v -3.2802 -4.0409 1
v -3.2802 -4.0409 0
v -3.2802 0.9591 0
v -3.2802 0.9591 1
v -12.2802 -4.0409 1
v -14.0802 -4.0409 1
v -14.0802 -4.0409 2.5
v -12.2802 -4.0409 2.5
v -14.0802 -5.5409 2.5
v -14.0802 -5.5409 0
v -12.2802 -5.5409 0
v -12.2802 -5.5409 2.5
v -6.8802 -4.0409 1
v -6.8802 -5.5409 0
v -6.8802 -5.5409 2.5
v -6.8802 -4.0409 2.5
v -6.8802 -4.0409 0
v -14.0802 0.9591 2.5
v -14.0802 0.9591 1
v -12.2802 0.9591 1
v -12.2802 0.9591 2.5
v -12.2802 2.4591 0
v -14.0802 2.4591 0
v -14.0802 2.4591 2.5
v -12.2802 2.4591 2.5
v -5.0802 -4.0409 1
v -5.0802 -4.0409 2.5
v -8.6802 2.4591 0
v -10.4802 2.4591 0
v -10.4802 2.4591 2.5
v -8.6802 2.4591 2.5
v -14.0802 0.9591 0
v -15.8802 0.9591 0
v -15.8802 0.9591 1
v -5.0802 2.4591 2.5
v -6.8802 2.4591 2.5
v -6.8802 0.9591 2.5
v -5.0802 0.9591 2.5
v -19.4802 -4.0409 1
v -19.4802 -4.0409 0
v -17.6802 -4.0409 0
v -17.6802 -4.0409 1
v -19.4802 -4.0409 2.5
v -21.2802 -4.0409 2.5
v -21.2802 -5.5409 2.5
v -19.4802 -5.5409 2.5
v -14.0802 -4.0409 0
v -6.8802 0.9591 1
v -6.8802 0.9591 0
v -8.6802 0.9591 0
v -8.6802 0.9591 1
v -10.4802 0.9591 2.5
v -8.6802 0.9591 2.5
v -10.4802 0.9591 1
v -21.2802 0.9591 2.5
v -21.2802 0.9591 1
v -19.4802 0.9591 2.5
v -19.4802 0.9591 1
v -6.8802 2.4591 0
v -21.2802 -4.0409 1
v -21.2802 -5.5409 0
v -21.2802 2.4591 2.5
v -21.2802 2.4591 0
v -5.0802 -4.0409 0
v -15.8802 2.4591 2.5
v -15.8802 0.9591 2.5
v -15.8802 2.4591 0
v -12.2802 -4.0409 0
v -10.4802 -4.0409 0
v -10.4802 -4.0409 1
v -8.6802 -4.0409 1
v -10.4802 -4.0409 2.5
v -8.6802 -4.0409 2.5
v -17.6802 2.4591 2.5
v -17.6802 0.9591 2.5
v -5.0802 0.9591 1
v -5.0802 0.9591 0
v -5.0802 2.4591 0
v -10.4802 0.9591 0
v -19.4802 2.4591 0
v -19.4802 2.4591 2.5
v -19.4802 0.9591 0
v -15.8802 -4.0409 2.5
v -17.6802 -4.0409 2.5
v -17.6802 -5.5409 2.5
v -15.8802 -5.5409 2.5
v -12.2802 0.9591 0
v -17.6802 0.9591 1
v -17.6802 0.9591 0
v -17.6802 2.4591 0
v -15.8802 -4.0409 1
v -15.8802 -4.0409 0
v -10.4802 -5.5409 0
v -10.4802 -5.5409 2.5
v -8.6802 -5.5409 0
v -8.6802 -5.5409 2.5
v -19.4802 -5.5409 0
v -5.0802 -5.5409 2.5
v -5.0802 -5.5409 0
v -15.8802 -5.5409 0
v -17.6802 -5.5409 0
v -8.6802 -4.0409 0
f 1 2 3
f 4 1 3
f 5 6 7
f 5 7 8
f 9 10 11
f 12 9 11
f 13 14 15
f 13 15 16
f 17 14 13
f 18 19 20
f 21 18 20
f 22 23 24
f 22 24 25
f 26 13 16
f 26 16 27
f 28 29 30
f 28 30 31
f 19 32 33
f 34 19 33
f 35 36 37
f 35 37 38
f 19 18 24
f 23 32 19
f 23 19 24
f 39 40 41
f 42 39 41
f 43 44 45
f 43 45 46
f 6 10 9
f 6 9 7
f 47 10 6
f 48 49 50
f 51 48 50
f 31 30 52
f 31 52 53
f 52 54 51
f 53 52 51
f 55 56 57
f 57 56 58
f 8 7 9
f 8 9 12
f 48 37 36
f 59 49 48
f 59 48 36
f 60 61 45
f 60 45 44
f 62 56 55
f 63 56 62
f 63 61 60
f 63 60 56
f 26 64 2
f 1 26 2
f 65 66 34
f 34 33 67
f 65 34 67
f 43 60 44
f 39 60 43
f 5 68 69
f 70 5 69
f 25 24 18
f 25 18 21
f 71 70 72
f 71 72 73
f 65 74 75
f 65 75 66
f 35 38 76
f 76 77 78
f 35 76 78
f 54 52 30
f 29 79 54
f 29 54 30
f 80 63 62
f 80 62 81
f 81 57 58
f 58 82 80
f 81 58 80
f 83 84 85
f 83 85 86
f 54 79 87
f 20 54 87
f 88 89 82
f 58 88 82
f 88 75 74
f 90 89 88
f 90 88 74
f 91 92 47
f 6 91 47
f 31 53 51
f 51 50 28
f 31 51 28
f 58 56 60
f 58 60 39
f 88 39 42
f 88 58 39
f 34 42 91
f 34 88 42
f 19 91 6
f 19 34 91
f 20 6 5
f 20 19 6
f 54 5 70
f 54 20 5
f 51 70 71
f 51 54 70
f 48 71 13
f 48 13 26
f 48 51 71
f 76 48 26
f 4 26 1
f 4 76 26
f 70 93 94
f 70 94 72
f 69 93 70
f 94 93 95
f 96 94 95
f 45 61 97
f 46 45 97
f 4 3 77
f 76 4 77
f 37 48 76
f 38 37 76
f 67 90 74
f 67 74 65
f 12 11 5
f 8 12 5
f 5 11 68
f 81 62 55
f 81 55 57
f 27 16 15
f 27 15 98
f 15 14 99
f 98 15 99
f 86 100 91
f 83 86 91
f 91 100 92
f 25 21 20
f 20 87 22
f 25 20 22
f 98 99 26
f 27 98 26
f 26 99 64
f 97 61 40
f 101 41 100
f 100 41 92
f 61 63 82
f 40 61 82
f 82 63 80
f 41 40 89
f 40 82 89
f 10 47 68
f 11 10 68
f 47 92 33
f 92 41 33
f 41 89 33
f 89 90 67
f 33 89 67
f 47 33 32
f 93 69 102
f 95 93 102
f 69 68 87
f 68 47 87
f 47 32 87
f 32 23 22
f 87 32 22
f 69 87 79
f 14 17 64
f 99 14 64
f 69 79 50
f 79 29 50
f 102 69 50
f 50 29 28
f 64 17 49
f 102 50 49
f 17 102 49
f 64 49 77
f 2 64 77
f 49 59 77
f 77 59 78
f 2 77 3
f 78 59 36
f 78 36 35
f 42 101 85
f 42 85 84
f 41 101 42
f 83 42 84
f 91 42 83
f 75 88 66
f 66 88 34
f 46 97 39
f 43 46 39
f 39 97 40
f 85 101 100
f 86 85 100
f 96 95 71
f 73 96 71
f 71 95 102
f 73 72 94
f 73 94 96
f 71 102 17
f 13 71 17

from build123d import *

# Parameters (mm, degrees)
F1_DEPTH = 1
F0_W     = 1.8
F0_H     = 1.5
F2_DEPTH = 2.5


with BuildPart() as f1:
    # F0 (on Top) → F1 (new body)
    with BuildSketch(Plane.XY):
        Polygon((-19.480222, 0.959121), (-21.280222, 0.959121), (-21.280222, -0.040879), (-21.280222, -3.040879), (-21.280222, -4.040879), (-19.480222, -4.040879), (-17.680222, -4.040879), (-15.880222, -4.040879), (-14.080222, -4.040879), (-12.280222, -4.040879), (-10.480222, -4.040879), (-8.680222, -4.040879), (-6.880222, -4.040879), (-5.080222, -4.040879), (-3.280222, -4.040879), (-3.280222, -3.040879), (-3.280222, -0.040879), (-3.280222, 0.959121), (-5.080222, 0.959121), (-6.880222, 0.959121), (-8.680222, 0.959121), (-10.480222, 0.959121), (-12.280222, 0.959121), (-14.080222, 0.959121), (-15.880222, 0.959121), (-17.680222, 0.959121), align=None)
    extrude(amount=F1_DEPTH)

    # F0 (on Top) → F2 (join)
    with BuildSketch(Plane.XY):
        with Locations((-20.380222, 1.709121)):
            Rectangle(F0_W, F0_H)
        with Locations((-16.780222, 1.709121)):
            Rectangle(F0_W, F0_H)
        with Locations((-13.180222, 1.709121)):
            Rectangle(F0_W, F0_H)
        with Locations((-9.580222, 1.709121)):
            Rectangle(F0_W, F0_H)
        with Locations((-5.980222, 1.709121)):
            Rectangle(F0_W, F0_H)
        with Locations((-5.980222, -4.790879)):
            Rectangle(F0_W, F0_H)
        with Locations((-9.580222, -4.790879)):
            Rectangle(F0_W, F0_H)
        with Locations((-13.180222, -4.790879)):
            Rectangle(F0_W, F0_H)
        with Locations((-16.780222, -4.790879)):
            Rectangle(F0_W, F0_H)
        with Locations((-20.380222, -4.790879)):
            Rectangle(F0_W, F0_H)
    extrude(amount=F2_DEPTH)


solid = f1.part
